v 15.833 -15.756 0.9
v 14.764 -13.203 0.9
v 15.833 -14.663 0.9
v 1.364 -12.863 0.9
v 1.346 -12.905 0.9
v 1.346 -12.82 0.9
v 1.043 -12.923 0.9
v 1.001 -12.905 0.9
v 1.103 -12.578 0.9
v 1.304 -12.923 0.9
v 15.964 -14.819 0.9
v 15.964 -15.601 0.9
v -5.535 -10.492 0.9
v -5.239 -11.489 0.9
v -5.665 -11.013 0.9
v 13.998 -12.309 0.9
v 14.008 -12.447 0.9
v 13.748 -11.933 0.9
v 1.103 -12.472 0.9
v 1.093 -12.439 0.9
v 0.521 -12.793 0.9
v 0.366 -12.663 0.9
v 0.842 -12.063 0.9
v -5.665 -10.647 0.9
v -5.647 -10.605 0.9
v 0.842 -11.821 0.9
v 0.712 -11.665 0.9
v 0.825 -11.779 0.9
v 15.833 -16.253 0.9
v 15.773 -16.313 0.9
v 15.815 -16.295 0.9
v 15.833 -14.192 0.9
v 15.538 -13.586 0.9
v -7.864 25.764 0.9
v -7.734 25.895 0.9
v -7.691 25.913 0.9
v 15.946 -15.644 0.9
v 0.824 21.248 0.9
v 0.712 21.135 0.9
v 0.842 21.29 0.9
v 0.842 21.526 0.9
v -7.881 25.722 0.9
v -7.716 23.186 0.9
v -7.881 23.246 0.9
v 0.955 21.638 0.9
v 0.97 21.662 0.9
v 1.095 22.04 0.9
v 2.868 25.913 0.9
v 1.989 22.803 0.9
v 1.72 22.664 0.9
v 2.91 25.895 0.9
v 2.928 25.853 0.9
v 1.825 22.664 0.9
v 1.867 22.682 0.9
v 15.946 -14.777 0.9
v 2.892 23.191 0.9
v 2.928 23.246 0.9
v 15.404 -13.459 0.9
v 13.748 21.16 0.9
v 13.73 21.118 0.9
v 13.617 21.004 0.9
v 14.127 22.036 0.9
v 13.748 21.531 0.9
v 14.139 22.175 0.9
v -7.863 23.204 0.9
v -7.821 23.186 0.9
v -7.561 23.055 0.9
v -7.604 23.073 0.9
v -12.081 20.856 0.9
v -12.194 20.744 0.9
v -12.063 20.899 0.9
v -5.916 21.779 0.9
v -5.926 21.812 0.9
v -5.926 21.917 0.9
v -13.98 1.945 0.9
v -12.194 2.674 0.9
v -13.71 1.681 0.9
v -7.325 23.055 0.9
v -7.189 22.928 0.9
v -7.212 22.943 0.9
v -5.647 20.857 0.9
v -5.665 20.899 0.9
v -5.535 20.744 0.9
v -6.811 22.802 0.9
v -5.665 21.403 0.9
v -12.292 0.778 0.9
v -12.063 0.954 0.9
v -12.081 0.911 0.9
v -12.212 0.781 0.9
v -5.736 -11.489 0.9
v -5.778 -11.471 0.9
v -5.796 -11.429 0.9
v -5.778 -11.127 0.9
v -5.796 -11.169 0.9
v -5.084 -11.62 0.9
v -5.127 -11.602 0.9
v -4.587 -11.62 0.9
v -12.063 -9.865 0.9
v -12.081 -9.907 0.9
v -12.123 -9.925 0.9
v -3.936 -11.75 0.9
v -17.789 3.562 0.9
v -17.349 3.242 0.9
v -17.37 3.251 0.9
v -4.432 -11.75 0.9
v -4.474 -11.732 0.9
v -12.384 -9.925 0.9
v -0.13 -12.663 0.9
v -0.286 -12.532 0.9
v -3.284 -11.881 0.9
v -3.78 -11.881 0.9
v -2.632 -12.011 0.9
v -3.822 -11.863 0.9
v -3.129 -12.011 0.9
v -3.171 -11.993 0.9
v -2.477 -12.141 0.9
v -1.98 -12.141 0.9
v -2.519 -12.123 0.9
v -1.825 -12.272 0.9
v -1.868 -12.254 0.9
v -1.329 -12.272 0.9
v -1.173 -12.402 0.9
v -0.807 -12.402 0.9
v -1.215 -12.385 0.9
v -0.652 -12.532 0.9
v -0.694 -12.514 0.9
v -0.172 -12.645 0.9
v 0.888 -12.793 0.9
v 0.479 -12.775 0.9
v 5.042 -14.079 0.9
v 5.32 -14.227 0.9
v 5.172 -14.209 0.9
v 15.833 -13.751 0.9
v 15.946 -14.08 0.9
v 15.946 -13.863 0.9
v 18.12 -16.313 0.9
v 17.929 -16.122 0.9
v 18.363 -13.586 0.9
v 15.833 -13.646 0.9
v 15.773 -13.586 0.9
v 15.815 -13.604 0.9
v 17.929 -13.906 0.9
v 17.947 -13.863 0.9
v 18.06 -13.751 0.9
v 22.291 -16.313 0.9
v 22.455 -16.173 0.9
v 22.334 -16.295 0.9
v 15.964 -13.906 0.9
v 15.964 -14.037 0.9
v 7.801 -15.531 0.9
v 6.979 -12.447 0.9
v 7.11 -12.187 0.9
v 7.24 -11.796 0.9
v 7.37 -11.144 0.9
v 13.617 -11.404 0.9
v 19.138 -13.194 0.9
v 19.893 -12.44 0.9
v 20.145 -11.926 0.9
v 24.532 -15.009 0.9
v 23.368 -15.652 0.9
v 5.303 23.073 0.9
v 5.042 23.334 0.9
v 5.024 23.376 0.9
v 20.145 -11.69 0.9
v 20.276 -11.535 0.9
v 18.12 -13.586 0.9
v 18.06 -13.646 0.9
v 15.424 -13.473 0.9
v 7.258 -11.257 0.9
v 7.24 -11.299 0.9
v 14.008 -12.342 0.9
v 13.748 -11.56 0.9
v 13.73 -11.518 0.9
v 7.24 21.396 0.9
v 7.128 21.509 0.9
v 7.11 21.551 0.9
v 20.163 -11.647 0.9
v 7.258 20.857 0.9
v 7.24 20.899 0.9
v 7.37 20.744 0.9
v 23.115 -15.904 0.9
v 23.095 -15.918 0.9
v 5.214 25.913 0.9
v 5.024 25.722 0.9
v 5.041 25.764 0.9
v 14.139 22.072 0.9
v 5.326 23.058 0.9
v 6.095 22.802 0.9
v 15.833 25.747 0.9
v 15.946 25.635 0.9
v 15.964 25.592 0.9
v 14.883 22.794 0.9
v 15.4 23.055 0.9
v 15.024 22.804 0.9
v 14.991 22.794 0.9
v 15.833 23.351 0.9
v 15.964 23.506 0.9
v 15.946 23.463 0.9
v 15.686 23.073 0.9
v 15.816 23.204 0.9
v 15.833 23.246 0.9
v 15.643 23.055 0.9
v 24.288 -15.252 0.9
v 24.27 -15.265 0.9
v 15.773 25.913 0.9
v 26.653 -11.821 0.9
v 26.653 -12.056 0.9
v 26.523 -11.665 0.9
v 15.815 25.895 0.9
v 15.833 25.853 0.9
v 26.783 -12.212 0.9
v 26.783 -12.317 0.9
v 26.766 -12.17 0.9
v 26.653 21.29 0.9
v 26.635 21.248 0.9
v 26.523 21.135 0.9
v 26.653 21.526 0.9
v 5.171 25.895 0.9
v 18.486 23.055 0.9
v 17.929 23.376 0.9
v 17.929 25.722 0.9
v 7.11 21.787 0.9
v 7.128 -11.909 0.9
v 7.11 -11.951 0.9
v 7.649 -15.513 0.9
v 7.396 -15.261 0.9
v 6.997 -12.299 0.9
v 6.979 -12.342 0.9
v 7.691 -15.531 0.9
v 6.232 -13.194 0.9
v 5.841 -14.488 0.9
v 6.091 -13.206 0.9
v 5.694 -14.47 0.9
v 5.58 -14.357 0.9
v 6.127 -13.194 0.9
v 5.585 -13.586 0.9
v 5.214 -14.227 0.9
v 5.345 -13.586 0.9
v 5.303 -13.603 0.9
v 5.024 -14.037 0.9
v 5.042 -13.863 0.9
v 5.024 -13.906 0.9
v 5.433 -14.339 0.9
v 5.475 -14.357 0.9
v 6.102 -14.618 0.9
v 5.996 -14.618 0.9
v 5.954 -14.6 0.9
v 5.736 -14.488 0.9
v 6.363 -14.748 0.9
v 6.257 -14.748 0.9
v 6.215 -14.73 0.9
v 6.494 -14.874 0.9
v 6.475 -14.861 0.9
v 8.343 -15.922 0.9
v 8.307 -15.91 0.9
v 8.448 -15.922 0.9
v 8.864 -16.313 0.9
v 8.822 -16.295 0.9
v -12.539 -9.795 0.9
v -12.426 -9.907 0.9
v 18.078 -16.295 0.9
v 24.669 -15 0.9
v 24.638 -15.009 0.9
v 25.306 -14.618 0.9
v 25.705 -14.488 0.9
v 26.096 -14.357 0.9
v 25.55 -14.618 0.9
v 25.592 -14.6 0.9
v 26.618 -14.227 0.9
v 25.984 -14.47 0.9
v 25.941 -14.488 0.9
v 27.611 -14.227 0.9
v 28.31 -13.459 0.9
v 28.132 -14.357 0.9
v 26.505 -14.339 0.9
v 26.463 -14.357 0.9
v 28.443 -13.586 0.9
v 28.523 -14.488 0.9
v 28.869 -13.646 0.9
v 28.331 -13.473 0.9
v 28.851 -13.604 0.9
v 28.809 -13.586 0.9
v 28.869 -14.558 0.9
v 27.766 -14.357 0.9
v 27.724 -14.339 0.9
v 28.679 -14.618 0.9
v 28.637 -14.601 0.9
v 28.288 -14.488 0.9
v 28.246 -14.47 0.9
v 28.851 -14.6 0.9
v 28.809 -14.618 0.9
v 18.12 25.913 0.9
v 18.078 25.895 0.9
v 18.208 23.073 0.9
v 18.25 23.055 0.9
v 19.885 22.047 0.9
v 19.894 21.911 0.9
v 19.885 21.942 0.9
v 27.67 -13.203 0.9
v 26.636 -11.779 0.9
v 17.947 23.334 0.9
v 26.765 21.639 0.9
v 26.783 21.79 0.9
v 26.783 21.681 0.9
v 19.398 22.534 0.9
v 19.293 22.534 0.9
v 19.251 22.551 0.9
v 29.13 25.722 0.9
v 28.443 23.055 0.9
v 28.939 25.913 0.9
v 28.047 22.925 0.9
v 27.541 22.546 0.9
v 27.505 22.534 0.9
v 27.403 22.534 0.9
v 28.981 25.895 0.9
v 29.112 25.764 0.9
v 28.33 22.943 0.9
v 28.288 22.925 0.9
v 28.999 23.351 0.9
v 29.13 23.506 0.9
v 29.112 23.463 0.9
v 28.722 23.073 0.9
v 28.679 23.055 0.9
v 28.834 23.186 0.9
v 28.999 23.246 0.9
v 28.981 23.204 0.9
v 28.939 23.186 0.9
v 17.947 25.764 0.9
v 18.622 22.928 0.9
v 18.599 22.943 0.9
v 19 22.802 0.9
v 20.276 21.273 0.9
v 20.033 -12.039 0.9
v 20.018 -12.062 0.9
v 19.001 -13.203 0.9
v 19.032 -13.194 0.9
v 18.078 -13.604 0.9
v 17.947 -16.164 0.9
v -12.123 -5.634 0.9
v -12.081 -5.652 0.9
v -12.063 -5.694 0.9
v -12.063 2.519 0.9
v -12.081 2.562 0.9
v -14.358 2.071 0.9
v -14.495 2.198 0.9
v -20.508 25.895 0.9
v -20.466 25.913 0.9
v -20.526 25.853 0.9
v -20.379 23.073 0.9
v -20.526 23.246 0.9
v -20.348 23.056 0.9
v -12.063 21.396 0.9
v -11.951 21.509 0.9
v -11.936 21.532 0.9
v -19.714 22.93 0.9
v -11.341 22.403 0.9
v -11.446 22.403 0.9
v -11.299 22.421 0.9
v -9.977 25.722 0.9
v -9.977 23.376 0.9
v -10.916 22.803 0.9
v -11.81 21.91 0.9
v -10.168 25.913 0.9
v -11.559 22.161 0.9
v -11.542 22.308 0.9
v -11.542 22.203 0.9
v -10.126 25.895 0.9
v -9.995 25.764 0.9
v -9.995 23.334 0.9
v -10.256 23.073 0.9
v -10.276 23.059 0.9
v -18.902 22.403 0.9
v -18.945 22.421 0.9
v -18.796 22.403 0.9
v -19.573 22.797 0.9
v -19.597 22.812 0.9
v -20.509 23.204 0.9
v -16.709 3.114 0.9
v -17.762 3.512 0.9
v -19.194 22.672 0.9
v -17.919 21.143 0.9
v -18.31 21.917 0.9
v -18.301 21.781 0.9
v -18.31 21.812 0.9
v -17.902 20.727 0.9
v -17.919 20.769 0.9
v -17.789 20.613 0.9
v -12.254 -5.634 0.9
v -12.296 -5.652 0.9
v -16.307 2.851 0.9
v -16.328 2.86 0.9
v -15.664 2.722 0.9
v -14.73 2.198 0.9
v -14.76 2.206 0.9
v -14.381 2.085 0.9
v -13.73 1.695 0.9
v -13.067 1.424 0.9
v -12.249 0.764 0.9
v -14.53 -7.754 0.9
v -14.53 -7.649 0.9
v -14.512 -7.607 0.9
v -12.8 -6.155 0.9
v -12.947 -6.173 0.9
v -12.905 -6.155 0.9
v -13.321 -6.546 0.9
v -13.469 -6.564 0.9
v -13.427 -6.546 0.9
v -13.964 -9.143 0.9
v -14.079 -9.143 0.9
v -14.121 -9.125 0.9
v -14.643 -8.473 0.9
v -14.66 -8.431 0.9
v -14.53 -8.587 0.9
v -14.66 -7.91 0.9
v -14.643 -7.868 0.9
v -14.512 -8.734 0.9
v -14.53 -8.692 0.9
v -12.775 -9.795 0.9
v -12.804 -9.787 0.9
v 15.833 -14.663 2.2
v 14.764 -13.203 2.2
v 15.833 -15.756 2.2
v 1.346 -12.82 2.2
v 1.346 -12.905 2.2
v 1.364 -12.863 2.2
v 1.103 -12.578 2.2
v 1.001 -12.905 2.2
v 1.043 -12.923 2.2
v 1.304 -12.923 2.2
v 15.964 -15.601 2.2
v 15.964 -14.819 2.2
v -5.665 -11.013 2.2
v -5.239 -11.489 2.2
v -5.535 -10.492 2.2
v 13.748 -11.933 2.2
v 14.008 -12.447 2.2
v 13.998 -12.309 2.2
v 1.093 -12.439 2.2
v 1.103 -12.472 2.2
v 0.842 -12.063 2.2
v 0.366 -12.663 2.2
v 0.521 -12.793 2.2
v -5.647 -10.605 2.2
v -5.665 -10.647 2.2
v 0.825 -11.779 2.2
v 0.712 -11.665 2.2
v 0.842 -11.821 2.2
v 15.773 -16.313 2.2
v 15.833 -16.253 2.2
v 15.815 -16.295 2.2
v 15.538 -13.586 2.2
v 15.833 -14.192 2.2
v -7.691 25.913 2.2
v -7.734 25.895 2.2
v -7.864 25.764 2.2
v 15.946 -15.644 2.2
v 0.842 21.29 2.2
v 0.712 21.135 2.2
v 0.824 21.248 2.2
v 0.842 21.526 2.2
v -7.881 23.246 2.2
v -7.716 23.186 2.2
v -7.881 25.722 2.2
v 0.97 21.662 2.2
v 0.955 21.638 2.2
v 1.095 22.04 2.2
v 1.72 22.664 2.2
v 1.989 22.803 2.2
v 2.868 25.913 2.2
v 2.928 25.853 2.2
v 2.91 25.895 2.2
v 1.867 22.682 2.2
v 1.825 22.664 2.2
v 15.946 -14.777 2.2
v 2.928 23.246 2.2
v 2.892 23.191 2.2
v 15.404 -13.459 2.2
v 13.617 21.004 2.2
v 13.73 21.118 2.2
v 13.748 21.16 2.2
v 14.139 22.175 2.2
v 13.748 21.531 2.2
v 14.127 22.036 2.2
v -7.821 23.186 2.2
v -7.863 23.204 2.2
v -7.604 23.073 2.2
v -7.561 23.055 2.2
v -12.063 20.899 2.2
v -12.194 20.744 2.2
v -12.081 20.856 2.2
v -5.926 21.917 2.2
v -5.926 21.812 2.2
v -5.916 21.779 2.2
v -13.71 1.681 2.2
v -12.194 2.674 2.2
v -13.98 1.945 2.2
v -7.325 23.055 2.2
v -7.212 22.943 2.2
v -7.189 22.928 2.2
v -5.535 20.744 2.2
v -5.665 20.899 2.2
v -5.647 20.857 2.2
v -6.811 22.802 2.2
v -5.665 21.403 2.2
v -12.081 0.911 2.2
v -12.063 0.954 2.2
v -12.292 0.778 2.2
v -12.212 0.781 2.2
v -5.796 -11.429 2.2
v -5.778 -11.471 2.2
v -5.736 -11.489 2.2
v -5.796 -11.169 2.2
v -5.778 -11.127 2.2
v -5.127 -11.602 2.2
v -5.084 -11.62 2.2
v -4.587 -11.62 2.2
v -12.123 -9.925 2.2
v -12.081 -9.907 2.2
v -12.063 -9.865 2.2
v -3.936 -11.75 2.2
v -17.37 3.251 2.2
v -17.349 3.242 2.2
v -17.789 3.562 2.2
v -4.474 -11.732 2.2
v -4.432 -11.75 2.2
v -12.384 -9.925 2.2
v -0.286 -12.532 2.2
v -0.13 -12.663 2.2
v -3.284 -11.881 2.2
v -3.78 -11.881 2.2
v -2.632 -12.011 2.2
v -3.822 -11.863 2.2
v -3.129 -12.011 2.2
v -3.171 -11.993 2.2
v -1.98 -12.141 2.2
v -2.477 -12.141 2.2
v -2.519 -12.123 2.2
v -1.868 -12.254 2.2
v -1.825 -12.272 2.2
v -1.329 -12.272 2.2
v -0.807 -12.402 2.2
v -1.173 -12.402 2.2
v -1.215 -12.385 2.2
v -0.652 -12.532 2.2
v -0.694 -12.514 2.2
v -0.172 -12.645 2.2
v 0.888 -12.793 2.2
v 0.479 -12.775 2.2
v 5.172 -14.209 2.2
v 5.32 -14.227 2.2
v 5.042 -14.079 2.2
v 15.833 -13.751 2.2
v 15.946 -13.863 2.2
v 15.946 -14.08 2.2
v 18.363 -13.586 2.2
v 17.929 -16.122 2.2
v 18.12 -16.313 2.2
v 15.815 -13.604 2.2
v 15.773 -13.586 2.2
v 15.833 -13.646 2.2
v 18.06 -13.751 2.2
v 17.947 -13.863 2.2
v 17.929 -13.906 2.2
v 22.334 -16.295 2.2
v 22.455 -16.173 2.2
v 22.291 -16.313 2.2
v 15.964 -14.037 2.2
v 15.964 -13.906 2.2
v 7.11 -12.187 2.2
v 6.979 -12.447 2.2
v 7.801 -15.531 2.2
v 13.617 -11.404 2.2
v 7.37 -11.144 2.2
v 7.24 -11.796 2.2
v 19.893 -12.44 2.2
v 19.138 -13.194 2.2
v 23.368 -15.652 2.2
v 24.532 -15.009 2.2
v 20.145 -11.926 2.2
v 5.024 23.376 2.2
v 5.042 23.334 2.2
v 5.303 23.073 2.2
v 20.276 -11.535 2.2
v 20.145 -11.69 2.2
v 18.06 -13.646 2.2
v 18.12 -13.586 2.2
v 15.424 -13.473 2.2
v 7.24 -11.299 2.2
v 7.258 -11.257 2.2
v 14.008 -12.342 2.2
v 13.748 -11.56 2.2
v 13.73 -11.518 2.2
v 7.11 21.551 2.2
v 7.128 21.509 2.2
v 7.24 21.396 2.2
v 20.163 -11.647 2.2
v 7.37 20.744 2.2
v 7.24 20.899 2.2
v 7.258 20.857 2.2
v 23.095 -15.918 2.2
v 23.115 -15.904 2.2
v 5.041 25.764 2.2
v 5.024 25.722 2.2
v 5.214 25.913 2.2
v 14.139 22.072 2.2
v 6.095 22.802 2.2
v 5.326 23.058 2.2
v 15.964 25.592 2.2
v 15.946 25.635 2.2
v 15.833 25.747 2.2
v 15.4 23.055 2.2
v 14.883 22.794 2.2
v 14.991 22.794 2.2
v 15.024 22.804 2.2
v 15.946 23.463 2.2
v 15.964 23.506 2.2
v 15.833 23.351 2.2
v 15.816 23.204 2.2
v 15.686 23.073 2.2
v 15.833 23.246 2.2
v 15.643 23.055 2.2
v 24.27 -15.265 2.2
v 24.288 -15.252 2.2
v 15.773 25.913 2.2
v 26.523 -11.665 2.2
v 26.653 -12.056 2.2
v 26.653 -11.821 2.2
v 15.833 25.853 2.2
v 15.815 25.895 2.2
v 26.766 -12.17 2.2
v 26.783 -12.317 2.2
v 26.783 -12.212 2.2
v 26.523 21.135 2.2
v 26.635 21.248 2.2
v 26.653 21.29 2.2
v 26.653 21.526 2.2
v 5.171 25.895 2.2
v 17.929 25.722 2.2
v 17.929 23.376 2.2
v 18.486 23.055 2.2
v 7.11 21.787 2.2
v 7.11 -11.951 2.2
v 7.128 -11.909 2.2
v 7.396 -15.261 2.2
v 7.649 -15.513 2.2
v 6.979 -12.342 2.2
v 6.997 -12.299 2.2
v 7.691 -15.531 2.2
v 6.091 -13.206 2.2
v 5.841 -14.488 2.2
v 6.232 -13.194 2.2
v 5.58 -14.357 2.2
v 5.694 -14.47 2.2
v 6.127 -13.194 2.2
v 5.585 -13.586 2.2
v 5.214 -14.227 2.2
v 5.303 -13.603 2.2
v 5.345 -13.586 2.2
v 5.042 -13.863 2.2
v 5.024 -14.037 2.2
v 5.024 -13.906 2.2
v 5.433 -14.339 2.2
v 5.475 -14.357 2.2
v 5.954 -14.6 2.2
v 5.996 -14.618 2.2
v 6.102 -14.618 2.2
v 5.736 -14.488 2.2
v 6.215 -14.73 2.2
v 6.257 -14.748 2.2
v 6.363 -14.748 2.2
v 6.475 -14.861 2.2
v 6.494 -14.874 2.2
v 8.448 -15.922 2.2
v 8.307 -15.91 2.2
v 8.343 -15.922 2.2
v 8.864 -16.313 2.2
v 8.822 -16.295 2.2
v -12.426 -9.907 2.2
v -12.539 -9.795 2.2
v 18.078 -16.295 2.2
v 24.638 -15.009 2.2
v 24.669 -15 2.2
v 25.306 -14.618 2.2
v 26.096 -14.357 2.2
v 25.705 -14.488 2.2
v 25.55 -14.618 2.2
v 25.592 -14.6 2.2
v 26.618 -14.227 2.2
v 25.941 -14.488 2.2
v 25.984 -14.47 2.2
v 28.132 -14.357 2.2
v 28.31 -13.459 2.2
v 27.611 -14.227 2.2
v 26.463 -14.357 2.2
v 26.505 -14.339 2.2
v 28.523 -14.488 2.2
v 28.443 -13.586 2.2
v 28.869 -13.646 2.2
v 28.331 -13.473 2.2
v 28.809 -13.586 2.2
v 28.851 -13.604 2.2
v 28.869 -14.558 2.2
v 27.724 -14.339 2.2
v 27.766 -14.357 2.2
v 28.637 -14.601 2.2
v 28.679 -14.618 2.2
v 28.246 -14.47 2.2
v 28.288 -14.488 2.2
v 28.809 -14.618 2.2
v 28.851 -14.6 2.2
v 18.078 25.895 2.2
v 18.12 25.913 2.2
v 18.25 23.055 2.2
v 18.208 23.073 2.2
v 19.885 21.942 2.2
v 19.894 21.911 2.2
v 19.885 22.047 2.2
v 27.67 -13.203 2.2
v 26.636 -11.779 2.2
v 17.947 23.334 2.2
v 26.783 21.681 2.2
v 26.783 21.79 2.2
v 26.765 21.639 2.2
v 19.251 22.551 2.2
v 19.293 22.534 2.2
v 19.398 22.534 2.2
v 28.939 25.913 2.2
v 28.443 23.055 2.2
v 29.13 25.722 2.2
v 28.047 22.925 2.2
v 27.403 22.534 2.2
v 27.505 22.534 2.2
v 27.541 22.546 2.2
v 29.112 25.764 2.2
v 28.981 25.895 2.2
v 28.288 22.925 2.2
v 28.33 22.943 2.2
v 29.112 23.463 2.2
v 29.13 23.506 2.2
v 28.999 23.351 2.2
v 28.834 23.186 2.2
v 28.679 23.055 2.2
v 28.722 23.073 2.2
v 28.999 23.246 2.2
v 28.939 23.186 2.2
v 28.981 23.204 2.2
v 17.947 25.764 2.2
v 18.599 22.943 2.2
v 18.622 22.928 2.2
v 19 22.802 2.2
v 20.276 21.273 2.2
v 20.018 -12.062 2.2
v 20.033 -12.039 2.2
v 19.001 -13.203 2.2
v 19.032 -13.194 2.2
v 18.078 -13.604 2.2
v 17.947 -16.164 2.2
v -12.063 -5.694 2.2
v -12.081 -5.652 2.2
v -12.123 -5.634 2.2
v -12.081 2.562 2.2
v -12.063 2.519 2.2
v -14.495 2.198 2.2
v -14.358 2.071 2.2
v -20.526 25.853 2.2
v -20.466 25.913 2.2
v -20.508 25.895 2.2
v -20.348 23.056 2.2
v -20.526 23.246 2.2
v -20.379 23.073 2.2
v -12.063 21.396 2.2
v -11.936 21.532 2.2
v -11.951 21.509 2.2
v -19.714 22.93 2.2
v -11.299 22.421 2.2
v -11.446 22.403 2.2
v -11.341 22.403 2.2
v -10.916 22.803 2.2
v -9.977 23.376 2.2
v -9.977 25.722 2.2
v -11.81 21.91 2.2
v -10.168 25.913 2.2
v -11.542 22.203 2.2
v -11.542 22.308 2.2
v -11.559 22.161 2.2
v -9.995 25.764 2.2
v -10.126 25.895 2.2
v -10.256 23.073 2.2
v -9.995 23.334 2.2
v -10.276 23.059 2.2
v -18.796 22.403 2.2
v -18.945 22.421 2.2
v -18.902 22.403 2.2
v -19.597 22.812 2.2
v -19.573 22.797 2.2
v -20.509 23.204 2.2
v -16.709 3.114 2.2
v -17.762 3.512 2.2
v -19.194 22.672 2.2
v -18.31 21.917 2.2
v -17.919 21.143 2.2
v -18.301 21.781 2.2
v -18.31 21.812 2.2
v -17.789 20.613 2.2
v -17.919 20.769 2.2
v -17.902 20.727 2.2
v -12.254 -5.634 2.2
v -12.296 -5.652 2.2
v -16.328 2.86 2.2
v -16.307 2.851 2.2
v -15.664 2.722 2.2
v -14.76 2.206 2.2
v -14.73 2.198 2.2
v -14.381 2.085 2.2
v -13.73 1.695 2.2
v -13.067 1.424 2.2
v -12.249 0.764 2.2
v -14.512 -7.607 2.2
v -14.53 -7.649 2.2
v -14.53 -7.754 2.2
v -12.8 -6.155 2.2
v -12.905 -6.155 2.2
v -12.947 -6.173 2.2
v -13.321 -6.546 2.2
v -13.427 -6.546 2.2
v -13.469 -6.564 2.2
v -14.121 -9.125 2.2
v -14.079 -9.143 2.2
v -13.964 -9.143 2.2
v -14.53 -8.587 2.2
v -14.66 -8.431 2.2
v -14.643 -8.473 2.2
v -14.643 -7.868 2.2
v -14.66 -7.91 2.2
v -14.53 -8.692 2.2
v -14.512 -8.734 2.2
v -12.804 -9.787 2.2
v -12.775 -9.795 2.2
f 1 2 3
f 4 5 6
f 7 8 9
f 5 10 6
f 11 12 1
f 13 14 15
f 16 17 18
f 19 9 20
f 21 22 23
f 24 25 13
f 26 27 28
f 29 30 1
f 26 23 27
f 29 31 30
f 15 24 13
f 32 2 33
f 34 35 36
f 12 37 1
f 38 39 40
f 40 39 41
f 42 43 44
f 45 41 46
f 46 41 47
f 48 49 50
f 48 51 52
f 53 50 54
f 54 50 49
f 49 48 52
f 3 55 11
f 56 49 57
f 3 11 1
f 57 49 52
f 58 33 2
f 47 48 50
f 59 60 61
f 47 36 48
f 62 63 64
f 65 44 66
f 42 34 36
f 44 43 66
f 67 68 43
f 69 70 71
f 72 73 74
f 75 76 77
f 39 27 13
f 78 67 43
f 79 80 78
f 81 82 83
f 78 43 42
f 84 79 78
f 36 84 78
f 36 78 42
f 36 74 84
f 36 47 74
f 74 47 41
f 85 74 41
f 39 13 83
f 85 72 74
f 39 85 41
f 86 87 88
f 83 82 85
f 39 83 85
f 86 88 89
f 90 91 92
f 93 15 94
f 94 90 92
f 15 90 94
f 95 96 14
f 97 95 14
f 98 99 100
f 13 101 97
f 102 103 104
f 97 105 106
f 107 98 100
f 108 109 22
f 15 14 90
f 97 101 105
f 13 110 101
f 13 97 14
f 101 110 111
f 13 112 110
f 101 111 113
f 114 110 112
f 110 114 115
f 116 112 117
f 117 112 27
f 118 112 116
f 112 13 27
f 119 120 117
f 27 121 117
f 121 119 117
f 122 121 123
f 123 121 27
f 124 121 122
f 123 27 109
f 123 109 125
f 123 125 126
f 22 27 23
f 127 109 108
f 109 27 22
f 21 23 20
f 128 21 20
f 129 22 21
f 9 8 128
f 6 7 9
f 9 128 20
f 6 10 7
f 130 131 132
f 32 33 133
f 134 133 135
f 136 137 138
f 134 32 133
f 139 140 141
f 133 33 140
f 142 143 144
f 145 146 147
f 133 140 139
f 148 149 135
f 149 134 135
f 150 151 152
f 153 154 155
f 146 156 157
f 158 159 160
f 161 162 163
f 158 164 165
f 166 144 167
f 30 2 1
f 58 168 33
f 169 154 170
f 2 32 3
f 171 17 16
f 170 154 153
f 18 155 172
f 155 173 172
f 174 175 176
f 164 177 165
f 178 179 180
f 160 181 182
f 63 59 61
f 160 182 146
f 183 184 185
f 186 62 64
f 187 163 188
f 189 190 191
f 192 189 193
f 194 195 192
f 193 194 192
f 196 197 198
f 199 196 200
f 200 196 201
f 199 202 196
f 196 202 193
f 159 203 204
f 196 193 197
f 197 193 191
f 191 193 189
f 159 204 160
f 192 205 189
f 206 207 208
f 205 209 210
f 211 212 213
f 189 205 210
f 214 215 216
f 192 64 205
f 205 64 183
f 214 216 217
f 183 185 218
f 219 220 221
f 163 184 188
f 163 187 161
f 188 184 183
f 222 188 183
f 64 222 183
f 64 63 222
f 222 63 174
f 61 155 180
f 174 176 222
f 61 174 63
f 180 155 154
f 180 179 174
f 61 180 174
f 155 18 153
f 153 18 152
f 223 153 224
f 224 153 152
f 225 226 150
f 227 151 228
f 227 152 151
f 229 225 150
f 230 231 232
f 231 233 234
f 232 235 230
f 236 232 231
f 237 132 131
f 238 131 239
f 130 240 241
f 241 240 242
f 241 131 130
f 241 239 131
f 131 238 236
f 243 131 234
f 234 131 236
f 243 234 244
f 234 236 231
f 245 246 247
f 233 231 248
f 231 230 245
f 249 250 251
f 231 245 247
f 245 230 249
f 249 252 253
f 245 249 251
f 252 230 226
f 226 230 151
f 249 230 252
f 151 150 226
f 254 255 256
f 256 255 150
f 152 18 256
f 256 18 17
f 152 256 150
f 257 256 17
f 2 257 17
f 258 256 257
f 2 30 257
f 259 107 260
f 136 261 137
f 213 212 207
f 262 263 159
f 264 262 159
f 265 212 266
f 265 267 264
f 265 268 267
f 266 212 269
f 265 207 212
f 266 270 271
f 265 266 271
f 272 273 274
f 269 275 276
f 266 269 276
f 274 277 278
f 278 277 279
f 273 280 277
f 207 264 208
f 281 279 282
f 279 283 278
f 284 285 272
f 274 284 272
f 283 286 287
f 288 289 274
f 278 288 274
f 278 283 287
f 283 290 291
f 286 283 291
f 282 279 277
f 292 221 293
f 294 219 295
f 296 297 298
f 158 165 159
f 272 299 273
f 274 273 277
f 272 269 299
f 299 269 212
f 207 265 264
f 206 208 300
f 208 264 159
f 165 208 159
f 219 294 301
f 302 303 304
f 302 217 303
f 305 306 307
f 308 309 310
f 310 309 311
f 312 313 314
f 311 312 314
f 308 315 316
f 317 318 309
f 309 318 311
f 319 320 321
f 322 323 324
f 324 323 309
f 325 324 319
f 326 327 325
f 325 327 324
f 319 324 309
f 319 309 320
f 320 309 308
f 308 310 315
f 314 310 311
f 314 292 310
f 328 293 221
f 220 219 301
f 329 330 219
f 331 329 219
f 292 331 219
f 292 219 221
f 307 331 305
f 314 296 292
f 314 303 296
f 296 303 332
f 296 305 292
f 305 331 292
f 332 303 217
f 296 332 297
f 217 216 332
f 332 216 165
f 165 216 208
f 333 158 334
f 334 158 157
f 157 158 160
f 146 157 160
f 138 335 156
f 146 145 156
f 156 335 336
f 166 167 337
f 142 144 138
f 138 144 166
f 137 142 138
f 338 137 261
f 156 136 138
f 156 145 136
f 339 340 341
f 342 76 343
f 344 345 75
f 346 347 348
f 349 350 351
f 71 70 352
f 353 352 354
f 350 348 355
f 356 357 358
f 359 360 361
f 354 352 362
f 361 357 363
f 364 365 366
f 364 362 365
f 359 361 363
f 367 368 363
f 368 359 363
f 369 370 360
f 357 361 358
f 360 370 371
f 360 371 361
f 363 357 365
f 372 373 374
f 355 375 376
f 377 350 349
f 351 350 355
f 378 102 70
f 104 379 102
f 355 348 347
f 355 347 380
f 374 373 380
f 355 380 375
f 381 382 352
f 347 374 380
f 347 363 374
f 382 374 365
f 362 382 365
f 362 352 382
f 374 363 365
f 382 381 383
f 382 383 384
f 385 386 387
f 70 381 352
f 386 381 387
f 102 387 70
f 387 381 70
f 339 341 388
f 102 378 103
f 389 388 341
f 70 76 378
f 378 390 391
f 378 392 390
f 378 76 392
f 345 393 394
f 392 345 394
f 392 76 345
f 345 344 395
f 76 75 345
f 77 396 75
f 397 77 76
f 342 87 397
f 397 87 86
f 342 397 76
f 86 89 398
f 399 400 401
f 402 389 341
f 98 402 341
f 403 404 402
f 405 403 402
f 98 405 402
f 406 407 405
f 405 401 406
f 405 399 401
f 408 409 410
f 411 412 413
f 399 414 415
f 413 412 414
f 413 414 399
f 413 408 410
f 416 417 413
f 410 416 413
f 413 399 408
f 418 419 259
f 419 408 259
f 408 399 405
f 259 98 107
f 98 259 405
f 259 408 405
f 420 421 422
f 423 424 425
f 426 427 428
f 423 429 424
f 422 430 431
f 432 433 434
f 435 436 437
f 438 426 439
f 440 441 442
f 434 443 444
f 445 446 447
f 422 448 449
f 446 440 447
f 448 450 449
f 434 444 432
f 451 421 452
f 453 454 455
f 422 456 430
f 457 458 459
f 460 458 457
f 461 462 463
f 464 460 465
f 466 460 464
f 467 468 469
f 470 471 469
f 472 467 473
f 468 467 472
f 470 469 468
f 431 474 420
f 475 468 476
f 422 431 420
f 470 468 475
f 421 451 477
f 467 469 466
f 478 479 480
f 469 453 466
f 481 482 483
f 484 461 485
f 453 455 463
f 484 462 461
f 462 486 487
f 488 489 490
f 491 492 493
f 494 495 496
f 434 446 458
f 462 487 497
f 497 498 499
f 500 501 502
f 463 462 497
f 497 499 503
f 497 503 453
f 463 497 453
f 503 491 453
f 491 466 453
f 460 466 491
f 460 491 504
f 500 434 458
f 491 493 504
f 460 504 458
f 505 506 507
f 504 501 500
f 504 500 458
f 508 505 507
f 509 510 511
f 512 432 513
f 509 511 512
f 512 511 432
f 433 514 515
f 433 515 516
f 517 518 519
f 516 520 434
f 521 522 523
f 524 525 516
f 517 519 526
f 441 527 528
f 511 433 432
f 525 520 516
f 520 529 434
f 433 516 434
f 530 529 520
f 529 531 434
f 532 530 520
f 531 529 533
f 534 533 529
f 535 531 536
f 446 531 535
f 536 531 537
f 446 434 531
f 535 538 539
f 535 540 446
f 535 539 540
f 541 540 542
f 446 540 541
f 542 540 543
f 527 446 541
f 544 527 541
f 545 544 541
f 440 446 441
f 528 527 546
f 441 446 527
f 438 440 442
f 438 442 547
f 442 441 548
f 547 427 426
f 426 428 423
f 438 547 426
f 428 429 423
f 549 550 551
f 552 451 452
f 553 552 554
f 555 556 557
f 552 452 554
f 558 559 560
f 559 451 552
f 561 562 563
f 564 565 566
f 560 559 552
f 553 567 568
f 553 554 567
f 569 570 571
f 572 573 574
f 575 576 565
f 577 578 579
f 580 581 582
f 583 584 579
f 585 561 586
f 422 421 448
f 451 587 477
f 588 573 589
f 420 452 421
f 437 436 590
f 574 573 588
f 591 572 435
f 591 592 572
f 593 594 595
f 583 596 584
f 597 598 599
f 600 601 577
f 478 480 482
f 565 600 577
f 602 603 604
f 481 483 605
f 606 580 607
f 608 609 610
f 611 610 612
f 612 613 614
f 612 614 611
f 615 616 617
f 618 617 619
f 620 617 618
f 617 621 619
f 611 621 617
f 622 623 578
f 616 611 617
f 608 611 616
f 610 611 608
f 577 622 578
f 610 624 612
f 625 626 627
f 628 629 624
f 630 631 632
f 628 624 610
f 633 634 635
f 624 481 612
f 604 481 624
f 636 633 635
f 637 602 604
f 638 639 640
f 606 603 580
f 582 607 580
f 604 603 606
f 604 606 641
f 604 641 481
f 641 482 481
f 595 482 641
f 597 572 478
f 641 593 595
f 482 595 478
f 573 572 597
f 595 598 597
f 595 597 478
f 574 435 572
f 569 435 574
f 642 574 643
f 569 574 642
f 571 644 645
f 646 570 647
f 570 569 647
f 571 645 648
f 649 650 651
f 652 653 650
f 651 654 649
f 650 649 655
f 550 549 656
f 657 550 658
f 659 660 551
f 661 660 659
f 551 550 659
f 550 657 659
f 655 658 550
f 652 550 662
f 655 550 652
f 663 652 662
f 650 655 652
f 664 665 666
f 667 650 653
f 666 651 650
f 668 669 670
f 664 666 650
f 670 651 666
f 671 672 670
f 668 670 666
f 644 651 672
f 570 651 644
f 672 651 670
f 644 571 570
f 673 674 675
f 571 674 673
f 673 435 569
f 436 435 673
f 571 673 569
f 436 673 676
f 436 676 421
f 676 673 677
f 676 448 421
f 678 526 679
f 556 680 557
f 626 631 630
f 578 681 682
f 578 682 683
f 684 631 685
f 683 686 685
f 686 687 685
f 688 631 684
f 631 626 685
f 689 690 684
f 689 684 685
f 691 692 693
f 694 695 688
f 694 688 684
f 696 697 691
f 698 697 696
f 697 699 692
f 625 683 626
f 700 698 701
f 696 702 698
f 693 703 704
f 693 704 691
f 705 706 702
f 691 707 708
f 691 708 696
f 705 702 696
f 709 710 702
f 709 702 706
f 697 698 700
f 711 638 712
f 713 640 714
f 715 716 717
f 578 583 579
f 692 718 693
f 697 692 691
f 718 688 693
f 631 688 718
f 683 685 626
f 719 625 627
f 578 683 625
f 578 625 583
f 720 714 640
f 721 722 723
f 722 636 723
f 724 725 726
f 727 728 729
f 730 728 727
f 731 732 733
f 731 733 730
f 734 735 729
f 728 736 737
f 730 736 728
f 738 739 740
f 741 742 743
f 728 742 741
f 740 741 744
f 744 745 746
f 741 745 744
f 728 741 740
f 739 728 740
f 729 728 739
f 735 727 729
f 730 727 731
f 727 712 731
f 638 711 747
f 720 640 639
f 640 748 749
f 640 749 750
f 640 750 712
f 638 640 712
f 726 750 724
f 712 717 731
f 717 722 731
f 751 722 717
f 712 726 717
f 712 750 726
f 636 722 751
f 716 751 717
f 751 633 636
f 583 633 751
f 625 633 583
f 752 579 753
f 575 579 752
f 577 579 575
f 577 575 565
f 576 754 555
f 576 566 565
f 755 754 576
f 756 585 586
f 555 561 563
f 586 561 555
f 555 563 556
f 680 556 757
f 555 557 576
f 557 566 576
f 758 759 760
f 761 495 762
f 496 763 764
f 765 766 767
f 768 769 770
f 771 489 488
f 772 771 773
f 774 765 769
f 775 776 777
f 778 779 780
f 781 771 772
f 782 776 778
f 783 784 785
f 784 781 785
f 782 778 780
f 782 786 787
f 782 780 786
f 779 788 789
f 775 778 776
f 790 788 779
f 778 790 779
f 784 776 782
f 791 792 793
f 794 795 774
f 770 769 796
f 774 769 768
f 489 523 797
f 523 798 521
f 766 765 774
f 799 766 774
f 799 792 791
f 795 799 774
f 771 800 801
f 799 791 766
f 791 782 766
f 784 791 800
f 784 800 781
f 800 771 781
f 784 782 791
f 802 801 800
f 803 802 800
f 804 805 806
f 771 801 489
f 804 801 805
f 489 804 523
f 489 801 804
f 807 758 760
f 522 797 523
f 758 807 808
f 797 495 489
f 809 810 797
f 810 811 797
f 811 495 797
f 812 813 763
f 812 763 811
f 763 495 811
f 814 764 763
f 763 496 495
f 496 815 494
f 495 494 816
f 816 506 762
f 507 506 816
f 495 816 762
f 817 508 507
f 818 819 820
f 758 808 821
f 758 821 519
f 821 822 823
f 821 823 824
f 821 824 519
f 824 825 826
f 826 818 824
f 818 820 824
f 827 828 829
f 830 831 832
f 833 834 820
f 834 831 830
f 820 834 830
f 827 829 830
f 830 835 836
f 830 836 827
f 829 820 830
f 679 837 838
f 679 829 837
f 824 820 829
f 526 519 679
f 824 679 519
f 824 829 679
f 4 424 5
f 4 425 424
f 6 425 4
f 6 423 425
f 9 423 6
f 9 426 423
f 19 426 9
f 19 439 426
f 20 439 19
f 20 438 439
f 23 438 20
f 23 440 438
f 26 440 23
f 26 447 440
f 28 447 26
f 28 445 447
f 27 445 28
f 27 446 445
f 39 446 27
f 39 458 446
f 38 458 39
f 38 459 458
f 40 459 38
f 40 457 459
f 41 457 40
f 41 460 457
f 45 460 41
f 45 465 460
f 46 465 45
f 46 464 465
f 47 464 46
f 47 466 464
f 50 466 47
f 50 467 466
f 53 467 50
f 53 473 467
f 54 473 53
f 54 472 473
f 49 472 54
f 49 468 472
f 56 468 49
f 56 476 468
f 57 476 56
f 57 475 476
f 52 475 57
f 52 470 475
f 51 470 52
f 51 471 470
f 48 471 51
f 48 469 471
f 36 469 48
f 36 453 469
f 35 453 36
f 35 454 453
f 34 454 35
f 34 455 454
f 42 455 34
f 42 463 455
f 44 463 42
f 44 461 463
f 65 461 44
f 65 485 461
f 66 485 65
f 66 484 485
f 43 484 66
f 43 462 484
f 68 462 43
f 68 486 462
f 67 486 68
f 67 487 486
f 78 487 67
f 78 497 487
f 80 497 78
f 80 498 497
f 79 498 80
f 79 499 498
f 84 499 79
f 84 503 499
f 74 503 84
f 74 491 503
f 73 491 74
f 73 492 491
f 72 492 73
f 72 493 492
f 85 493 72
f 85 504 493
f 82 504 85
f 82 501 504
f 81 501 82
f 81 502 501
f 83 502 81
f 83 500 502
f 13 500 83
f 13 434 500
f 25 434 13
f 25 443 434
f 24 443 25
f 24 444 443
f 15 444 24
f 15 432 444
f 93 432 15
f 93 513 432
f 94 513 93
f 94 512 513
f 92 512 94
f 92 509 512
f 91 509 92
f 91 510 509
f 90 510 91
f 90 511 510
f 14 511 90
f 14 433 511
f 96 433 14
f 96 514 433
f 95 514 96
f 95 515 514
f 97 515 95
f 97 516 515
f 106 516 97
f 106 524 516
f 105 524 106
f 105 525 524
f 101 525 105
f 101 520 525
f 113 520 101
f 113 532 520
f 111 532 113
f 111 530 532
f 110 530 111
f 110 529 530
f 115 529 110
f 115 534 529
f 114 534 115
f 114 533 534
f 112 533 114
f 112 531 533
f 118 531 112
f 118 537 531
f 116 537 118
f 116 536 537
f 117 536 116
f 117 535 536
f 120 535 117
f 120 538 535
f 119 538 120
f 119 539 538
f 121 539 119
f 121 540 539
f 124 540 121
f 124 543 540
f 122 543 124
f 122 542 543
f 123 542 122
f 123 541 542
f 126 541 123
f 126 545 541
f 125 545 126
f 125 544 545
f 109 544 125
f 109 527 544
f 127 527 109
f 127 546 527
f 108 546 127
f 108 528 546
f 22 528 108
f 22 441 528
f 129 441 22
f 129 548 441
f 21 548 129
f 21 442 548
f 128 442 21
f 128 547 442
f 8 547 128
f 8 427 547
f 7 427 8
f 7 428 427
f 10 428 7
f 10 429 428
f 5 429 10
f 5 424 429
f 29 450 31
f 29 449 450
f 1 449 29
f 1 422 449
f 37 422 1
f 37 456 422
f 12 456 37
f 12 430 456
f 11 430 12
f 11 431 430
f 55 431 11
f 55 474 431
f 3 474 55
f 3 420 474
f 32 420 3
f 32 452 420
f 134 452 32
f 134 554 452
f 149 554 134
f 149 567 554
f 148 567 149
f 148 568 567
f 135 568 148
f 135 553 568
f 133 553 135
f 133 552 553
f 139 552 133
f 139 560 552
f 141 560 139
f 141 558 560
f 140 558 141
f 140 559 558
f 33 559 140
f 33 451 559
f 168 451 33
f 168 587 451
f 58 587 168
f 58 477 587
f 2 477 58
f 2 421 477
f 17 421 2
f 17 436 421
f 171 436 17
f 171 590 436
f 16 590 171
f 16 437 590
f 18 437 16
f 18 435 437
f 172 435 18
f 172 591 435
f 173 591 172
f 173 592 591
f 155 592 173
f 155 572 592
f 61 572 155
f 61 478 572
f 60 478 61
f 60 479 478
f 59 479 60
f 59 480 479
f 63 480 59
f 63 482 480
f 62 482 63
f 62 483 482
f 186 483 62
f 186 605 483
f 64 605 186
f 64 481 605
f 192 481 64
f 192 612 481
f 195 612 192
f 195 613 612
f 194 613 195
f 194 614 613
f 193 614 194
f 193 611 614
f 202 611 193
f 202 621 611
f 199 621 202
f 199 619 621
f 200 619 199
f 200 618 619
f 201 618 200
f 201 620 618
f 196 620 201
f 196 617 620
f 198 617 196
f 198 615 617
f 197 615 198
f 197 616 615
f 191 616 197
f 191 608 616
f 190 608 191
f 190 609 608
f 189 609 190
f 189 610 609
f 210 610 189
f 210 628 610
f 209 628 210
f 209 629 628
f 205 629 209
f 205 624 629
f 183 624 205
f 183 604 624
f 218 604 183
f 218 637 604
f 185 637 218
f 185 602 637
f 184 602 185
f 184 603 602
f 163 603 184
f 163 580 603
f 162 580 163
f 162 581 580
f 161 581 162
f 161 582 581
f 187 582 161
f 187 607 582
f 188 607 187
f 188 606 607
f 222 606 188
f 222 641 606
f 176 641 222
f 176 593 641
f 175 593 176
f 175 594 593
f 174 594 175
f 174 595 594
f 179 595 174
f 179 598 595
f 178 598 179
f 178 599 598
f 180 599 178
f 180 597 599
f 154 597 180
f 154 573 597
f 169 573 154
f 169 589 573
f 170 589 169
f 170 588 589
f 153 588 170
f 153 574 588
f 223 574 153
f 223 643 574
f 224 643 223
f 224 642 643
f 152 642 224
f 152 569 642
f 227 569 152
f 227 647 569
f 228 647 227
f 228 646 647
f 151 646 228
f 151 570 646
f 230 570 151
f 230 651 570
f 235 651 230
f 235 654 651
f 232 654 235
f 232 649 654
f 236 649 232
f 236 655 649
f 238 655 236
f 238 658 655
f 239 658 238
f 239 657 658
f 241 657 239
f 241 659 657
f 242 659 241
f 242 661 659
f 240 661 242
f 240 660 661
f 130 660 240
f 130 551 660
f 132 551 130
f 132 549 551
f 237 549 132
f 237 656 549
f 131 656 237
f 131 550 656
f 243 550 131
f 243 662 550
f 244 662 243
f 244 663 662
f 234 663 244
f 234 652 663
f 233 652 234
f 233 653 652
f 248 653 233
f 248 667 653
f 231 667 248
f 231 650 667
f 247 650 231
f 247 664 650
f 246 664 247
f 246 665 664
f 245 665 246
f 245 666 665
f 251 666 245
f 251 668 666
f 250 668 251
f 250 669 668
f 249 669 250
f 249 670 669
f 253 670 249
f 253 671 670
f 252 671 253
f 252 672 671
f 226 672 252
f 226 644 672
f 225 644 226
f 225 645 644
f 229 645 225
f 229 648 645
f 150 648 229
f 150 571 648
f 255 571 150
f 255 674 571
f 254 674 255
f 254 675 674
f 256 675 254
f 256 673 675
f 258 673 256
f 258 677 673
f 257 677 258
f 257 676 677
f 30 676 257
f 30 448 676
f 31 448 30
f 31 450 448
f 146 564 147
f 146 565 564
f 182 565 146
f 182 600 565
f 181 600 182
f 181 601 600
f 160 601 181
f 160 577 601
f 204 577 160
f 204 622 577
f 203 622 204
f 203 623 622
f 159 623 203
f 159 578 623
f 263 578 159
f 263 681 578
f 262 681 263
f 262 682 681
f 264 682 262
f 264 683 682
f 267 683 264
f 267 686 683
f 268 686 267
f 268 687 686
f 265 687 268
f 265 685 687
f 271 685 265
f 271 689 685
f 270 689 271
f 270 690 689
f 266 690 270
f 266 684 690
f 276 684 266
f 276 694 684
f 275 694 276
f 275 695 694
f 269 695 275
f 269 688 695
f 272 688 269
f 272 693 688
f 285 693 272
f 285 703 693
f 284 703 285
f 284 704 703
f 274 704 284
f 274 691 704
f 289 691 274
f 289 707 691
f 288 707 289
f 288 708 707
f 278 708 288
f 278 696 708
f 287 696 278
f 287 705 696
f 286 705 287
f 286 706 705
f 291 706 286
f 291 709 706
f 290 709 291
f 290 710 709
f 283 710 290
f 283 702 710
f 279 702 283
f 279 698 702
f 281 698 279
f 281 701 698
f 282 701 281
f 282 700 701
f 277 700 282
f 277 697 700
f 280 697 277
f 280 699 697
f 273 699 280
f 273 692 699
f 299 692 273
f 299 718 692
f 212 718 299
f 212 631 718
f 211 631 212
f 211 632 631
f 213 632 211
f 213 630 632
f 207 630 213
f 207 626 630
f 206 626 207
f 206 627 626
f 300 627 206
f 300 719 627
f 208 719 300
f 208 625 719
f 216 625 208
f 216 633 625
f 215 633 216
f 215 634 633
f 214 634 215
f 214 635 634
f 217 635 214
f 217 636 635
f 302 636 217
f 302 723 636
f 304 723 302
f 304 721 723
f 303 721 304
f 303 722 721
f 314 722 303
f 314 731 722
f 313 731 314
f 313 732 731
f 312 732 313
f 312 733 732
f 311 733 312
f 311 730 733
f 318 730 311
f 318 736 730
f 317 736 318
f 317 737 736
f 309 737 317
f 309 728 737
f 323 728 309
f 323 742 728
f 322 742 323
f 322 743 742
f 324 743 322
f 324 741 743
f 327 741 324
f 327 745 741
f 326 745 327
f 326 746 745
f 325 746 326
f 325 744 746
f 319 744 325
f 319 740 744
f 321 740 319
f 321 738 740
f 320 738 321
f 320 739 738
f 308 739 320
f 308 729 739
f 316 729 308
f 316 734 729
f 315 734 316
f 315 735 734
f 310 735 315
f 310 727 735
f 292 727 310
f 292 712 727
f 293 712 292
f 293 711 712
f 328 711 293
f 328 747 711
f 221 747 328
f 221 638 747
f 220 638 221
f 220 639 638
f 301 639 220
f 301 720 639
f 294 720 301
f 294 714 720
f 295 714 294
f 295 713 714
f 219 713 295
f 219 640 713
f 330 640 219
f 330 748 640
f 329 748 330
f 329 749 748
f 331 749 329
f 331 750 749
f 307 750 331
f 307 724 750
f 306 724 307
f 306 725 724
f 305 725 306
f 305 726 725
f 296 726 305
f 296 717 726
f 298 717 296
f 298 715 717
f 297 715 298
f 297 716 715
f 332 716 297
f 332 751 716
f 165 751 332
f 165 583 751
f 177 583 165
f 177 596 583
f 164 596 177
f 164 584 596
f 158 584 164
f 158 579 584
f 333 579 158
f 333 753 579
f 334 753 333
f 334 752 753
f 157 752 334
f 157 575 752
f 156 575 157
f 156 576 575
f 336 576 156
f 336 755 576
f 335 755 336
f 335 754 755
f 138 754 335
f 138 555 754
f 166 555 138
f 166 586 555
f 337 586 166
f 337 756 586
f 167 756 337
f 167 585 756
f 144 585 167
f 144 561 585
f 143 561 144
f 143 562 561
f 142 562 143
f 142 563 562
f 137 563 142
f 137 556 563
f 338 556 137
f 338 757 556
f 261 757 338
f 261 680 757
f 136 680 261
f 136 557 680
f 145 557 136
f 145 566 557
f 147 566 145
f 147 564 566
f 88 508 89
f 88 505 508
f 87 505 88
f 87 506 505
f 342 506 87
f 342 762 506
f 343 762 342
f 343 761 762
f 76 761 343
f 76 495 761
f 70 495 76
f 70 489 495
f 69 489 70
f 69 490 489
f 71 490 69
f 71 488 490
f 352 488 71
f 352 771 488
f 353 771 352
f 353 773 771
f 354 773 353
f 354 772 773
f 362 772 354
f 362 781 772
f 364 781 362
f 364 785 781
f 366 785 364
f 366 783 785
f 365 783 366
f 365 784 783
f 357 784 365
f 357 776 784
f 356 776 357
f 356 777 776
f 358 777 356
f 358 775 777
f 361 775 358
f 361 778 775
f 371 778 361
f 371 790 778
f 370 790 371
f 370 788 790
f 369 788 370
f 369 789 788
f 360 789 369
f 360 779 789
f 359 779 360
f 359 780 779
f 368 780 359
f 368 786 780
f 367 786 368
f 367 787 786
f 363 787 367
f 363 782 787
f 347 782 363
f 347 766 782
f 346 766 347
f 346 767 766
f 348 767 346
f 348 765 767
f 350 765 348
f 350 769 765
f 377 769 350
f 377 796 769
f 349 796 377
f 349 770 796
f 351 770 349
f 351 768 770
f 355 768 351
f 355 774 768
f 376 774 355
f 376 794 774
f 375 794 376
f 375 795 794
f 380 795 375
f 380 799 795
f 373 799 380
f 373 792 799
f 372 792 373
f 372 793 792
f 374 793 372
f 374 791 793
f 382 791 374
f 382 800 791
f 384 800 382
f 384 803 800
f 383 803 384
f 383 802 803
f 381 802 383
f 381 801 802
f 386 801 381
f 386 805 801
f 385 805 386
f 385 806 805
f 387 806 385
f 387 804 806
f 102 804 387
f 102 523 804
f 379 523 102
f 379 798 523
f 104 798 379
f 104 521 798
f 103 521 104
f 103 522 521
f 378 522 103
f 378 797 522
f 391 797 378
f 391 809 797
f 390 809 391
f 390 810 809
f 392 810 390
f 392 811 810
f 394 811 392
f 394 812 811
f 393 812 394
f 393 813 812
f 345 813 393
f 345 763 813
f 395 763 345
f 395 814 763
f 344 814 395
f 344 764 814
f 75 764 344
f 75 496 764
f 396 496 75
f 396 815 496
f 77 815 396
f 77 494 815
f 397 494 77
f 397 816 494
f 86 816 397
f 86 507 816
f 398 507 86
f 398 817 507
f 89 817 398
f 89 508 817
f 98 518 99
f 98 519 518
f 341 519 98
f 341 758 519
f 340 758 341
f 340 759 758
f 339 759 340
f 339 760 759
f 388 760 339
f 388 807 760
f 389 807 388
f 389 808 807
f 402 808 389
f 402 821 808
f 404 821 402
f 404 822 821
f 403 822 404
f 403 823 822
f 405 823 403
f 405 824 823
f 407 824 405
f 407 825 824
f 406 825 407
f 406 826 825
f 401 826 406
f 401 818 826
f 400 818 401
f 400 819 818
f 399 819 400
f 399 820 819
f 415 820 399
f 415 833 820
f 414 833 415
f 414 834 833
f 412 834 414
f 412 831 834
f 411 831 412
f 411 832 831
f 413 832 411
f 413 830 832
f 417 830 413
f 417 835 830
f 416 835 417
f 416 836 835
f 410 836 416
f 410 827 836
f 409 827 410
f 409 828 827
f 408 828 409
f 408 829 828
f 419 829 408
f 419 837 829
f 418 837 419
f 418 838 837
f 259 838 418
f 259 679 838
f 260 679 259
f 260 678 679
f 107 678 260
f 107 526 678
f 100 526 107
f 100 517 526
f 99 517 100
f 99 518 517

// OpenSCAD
$fn = 24;
translate([0, -2.500, 0.900])
  linear_extrude(height=1.300) {
offset(r=0.06, $fn=8) {
    polygon(points=[[-12.123,-3.194],[-12.254,-3.194],[-12.775,-3.715],[-12.905,-3.715],[-13.296,-4.106],[-13.427,-4.106],[-14.470,-5.149],[-14.470,-5.279],[-14.600,-5.410],[-14.600,-5.931],[-14.470,-6.062],[-14.470,-6.192],[-14.079,-6.583],[-13.948,-6.583],[-12.775,-7.235],[-12.514,-7.235],[-12.384,-7.365],[-12.123,-7.365]], paths=[[0,1,2,3,4,5,6,7,8,9,10,11,12,13,14,15,16,17]]);
    polygon(points=[[28.939,28.353],[18.120,28.353],[17.989,28.222],[17.989,25.876],[18.250,25.615],[18.511,25.615],[18.641,25.485],[19.032,25.354],[19.293,25.094],[19.423,25.094],[19.945,24.572],[19.945,24.442],[20.336,23.790],[20.336,-9.060],[20.205,-9.190],[20.205,-9.451],[20.075,-9.581],[19.945,-9.972],[19.163,-10.754],[19.032,-10.754],[18.380,-11.146],[18.120,-11.146],[18.120,-11.276],[17.989,-11.406],[17.989,-13.622],[18.120,-13.753],[22.291,-13.753],[22.421,-13.622],[23.073,-13.362],[23.334,-13.101],[24.246,-12.710],[24.507,-12.449],[24.638,-12.449],[25.289,-12.058],[25.550,-12.058],[25.680,-11.928],[25.941,-11.928],[26.071,-11.797],[26.463,-11.797],[26.593,-11.667],[27.636,-11.667],[27.766,-11.797],[28.157,-11.797],[28.288,-11.928],[28.548,-11.928],[28.679,-12.058],[28.809,-12.058],[28.809,-11.146],[28.418,-11.146],[28.288,-11.015],[27.636,-10.754],[26.723,-9.842],[26.723,-9.712],[26.593,-9.581],[26.593,-9.321],[26.463,-9.190],[26.463,23.660],[26.593,23.790],[26.593,24.051],[26.723,24.181],[26.723,24.312],[27.375,25.094],[27.505,25.094],[28.027,25.485],[28.288,25.485],[28.418,25.615],[28.679,25.615],[28.809,25.746],[28.939,25.746],[28.939,25.876],[29.070,26.006],[29.070,28.222]], paths=[[0,1,2,3,4,5,6,7,8,9,10,11,12,13,14,15,16,17,18,19,20,21,22,23,24,25,26,27,28,29,30,31,32,33,34,35,36,37,38,39,40,41,42,43,44,45,46,47,48,49,50,51,52,53,54,55,56,57,58,59,60,61,62,63,64,65,66,67,68,69,70,71]]);
    polygon(points=[[5.214,28.353],[5.084,28.222],[5.084,25.876],[5.345,25.615],[6.127,25.354],[7.170,24.312],[7.170,24.051],[7.300,23.921],[7.300,23.399],[7.430,23.269],[7.430,-8.669],[7.300,-8.799],[7.300,-9.321],[7.170,-9.451],[7.170,-9.712],[7.039,-9.842],[7.039,-9.972],[6.257,-10.754],[6.127,-10.754],[5.605,-11.146],[5.345,-11.146],[5.084,-11.406],[5.084,-11.537],[5.214,-11.667],[5.345,-11.667],[5.475,-11.797],[5.605,-11.797],[5.736,-11.928],[5.866,-11.928],[5.996,-12.058],[6.127,-12.058],[6.257,-12.188],[6.388,-12.188],[6.518,-12.319],[7.430,-12.710],[7.691,-12.971],[7.821,-12.971],[8.343,-13.362],[8.473,-13.362],[8.864,-13.753],[15.773,-13.753],[15.773,-13.231],[15.904,-13.101],[15.904,-12.319],[15.773,-12.188],[15.773,-11.667],[15.904,-11.537],[15.904,-11.406],[15.773,-11.276],[15.773,-11.146],[15.513,-11.146],[15.382,-11.015],[14.730,-10.754],[13.948,-9.972],[13.948,-9.842],[13.688,-9.451],[13.688,-9.060],[13.557,-8.929],[13.557,23.529],[13.688,23.660],[13.688,24.051],[14.079,24.572],[14.079,24.703],[14.861,25.354],[14.991,25.354],[15.382,25.615],[15.643,25.615],[15.773,25.746],[15.773,25.876],[15.904,26.006],[15.904,28.092],[15.773,28.222],[15.773,28.353]], paths=[[0,1,2,3,4,5,6,7,8,9,10,11,12,13,14,15,16,17,18,19,20,21,22,23,24,25,26,27,28,29,30,31,32,33,34,35,36,37,38,39,40,41,42,43,44,45,46,47,48,49,50,51,52,53,54,55,56,57,58,59,60,61,62,63,64,65,66,67,68,69,70,71,72]]);
    polygon(points=[[-7.691,28.353],[-7.821,28.222],[-7.821,25.746],[-7.691,25.746],[-7.561,25.615],[-7.300,25.615],[-7.170,25.485],[-6.779,25.354],[-5.866,24.442],[-5.866,24.312],[-5.605,23.921],[-5.605,23.399],[-5.475,23.269],[-5.475,-8.017],[-5.605,-8.147],[-5.605,-8.538],[-5.736,-8.669],[-5.736,-8.929],[-5.214,-8.929],[-5.084,-9.060],[-4.562,-9.060],[-4.432,-9.190],[-3.911,-9.190],[-3.780,-9.321],[-3.259,-9.321],[-3.129,-9.451],[-2.607,-9.451],[-2.477,-9.581],[-1.955,-9.581],[-1.825,-9.712],[-1.304,-9.712],[-1.173,-9.842],[-0.782,-9.842],[-0.652,-9.972],[-0.261,-9.972],[-0.130,-10.103],[0.391,-10.103],[0.521,-10.233],[0.913,-10.233],[1.043,-10.363],[1.304,-10.363],[1.043,-10.103],[1.043,-9.972],[0.782,-9.581],[0.782,-9.321],[0.652,-9.190],[0.652,23.660],[0.782,23.790],[0.782,24.051],[0.913,24.181],[1.043,24.572],[1.695,25.224],[1.825,25.224],[1.955,25.354],[2.868,25.746],[2.868,28.353]], paths=[[0,1,2,3,4,5,6,7,8,9,10,11,12,13,14,15,16,17,18,19,20,21,22,23,24,25,26,27,28,29,30,31,32,33,34,35,36,37,38,39,40,41,42,43,44,45,46,47,48,49,50,51,52,53,54,55]]);
    polygon(points=[[-20.466,28.353],[-20.466,25.746],[-20.336,25.615],[-19.684,25.485],[-19.554,25.354],[-19.162,25.224],[-18.902,24.963],[-18.771,24.963],[-18.250,24.442],[-18.250,24.312],[-17.859,23.660],[-17.859,23.269],[-17.729,23.138],[-17.729,6.062],[-17.337,5.801],[-16.686,5.671],[-16.295,5.410],[-15.643,5.279],[-14.730,4.758],[-14.470,4.758],[-14.339,4.628],[-13.948,4.497],[-13.688,4.237],[-13.036,3.976],[-12.254,3.324],[-12.123,3.454],[-12.123,5.019],[-12.254,5.149],[-12.254,23.269],[-12.123,23.399],[-12.123,23.921],[-11.993,24.051],[-11.862,24.442],[-11.602,24.703],[-11.602,24.833],[-11.471,24.963],[-11.341,24.963],[-10.950,25.354],[-10.298,25.615],[-10.037,25.876],[-10.037,28.222],[-10.168,28.353]], paths=[[0,1,2,3,4,5,6,7,8,9,10,11,12,13,14,15,16,17,18,19,20,21,22,23,24,25,26,27,28,29,30,31,32,33,34,35,36,37,38,39,40,41]]);
}
}
